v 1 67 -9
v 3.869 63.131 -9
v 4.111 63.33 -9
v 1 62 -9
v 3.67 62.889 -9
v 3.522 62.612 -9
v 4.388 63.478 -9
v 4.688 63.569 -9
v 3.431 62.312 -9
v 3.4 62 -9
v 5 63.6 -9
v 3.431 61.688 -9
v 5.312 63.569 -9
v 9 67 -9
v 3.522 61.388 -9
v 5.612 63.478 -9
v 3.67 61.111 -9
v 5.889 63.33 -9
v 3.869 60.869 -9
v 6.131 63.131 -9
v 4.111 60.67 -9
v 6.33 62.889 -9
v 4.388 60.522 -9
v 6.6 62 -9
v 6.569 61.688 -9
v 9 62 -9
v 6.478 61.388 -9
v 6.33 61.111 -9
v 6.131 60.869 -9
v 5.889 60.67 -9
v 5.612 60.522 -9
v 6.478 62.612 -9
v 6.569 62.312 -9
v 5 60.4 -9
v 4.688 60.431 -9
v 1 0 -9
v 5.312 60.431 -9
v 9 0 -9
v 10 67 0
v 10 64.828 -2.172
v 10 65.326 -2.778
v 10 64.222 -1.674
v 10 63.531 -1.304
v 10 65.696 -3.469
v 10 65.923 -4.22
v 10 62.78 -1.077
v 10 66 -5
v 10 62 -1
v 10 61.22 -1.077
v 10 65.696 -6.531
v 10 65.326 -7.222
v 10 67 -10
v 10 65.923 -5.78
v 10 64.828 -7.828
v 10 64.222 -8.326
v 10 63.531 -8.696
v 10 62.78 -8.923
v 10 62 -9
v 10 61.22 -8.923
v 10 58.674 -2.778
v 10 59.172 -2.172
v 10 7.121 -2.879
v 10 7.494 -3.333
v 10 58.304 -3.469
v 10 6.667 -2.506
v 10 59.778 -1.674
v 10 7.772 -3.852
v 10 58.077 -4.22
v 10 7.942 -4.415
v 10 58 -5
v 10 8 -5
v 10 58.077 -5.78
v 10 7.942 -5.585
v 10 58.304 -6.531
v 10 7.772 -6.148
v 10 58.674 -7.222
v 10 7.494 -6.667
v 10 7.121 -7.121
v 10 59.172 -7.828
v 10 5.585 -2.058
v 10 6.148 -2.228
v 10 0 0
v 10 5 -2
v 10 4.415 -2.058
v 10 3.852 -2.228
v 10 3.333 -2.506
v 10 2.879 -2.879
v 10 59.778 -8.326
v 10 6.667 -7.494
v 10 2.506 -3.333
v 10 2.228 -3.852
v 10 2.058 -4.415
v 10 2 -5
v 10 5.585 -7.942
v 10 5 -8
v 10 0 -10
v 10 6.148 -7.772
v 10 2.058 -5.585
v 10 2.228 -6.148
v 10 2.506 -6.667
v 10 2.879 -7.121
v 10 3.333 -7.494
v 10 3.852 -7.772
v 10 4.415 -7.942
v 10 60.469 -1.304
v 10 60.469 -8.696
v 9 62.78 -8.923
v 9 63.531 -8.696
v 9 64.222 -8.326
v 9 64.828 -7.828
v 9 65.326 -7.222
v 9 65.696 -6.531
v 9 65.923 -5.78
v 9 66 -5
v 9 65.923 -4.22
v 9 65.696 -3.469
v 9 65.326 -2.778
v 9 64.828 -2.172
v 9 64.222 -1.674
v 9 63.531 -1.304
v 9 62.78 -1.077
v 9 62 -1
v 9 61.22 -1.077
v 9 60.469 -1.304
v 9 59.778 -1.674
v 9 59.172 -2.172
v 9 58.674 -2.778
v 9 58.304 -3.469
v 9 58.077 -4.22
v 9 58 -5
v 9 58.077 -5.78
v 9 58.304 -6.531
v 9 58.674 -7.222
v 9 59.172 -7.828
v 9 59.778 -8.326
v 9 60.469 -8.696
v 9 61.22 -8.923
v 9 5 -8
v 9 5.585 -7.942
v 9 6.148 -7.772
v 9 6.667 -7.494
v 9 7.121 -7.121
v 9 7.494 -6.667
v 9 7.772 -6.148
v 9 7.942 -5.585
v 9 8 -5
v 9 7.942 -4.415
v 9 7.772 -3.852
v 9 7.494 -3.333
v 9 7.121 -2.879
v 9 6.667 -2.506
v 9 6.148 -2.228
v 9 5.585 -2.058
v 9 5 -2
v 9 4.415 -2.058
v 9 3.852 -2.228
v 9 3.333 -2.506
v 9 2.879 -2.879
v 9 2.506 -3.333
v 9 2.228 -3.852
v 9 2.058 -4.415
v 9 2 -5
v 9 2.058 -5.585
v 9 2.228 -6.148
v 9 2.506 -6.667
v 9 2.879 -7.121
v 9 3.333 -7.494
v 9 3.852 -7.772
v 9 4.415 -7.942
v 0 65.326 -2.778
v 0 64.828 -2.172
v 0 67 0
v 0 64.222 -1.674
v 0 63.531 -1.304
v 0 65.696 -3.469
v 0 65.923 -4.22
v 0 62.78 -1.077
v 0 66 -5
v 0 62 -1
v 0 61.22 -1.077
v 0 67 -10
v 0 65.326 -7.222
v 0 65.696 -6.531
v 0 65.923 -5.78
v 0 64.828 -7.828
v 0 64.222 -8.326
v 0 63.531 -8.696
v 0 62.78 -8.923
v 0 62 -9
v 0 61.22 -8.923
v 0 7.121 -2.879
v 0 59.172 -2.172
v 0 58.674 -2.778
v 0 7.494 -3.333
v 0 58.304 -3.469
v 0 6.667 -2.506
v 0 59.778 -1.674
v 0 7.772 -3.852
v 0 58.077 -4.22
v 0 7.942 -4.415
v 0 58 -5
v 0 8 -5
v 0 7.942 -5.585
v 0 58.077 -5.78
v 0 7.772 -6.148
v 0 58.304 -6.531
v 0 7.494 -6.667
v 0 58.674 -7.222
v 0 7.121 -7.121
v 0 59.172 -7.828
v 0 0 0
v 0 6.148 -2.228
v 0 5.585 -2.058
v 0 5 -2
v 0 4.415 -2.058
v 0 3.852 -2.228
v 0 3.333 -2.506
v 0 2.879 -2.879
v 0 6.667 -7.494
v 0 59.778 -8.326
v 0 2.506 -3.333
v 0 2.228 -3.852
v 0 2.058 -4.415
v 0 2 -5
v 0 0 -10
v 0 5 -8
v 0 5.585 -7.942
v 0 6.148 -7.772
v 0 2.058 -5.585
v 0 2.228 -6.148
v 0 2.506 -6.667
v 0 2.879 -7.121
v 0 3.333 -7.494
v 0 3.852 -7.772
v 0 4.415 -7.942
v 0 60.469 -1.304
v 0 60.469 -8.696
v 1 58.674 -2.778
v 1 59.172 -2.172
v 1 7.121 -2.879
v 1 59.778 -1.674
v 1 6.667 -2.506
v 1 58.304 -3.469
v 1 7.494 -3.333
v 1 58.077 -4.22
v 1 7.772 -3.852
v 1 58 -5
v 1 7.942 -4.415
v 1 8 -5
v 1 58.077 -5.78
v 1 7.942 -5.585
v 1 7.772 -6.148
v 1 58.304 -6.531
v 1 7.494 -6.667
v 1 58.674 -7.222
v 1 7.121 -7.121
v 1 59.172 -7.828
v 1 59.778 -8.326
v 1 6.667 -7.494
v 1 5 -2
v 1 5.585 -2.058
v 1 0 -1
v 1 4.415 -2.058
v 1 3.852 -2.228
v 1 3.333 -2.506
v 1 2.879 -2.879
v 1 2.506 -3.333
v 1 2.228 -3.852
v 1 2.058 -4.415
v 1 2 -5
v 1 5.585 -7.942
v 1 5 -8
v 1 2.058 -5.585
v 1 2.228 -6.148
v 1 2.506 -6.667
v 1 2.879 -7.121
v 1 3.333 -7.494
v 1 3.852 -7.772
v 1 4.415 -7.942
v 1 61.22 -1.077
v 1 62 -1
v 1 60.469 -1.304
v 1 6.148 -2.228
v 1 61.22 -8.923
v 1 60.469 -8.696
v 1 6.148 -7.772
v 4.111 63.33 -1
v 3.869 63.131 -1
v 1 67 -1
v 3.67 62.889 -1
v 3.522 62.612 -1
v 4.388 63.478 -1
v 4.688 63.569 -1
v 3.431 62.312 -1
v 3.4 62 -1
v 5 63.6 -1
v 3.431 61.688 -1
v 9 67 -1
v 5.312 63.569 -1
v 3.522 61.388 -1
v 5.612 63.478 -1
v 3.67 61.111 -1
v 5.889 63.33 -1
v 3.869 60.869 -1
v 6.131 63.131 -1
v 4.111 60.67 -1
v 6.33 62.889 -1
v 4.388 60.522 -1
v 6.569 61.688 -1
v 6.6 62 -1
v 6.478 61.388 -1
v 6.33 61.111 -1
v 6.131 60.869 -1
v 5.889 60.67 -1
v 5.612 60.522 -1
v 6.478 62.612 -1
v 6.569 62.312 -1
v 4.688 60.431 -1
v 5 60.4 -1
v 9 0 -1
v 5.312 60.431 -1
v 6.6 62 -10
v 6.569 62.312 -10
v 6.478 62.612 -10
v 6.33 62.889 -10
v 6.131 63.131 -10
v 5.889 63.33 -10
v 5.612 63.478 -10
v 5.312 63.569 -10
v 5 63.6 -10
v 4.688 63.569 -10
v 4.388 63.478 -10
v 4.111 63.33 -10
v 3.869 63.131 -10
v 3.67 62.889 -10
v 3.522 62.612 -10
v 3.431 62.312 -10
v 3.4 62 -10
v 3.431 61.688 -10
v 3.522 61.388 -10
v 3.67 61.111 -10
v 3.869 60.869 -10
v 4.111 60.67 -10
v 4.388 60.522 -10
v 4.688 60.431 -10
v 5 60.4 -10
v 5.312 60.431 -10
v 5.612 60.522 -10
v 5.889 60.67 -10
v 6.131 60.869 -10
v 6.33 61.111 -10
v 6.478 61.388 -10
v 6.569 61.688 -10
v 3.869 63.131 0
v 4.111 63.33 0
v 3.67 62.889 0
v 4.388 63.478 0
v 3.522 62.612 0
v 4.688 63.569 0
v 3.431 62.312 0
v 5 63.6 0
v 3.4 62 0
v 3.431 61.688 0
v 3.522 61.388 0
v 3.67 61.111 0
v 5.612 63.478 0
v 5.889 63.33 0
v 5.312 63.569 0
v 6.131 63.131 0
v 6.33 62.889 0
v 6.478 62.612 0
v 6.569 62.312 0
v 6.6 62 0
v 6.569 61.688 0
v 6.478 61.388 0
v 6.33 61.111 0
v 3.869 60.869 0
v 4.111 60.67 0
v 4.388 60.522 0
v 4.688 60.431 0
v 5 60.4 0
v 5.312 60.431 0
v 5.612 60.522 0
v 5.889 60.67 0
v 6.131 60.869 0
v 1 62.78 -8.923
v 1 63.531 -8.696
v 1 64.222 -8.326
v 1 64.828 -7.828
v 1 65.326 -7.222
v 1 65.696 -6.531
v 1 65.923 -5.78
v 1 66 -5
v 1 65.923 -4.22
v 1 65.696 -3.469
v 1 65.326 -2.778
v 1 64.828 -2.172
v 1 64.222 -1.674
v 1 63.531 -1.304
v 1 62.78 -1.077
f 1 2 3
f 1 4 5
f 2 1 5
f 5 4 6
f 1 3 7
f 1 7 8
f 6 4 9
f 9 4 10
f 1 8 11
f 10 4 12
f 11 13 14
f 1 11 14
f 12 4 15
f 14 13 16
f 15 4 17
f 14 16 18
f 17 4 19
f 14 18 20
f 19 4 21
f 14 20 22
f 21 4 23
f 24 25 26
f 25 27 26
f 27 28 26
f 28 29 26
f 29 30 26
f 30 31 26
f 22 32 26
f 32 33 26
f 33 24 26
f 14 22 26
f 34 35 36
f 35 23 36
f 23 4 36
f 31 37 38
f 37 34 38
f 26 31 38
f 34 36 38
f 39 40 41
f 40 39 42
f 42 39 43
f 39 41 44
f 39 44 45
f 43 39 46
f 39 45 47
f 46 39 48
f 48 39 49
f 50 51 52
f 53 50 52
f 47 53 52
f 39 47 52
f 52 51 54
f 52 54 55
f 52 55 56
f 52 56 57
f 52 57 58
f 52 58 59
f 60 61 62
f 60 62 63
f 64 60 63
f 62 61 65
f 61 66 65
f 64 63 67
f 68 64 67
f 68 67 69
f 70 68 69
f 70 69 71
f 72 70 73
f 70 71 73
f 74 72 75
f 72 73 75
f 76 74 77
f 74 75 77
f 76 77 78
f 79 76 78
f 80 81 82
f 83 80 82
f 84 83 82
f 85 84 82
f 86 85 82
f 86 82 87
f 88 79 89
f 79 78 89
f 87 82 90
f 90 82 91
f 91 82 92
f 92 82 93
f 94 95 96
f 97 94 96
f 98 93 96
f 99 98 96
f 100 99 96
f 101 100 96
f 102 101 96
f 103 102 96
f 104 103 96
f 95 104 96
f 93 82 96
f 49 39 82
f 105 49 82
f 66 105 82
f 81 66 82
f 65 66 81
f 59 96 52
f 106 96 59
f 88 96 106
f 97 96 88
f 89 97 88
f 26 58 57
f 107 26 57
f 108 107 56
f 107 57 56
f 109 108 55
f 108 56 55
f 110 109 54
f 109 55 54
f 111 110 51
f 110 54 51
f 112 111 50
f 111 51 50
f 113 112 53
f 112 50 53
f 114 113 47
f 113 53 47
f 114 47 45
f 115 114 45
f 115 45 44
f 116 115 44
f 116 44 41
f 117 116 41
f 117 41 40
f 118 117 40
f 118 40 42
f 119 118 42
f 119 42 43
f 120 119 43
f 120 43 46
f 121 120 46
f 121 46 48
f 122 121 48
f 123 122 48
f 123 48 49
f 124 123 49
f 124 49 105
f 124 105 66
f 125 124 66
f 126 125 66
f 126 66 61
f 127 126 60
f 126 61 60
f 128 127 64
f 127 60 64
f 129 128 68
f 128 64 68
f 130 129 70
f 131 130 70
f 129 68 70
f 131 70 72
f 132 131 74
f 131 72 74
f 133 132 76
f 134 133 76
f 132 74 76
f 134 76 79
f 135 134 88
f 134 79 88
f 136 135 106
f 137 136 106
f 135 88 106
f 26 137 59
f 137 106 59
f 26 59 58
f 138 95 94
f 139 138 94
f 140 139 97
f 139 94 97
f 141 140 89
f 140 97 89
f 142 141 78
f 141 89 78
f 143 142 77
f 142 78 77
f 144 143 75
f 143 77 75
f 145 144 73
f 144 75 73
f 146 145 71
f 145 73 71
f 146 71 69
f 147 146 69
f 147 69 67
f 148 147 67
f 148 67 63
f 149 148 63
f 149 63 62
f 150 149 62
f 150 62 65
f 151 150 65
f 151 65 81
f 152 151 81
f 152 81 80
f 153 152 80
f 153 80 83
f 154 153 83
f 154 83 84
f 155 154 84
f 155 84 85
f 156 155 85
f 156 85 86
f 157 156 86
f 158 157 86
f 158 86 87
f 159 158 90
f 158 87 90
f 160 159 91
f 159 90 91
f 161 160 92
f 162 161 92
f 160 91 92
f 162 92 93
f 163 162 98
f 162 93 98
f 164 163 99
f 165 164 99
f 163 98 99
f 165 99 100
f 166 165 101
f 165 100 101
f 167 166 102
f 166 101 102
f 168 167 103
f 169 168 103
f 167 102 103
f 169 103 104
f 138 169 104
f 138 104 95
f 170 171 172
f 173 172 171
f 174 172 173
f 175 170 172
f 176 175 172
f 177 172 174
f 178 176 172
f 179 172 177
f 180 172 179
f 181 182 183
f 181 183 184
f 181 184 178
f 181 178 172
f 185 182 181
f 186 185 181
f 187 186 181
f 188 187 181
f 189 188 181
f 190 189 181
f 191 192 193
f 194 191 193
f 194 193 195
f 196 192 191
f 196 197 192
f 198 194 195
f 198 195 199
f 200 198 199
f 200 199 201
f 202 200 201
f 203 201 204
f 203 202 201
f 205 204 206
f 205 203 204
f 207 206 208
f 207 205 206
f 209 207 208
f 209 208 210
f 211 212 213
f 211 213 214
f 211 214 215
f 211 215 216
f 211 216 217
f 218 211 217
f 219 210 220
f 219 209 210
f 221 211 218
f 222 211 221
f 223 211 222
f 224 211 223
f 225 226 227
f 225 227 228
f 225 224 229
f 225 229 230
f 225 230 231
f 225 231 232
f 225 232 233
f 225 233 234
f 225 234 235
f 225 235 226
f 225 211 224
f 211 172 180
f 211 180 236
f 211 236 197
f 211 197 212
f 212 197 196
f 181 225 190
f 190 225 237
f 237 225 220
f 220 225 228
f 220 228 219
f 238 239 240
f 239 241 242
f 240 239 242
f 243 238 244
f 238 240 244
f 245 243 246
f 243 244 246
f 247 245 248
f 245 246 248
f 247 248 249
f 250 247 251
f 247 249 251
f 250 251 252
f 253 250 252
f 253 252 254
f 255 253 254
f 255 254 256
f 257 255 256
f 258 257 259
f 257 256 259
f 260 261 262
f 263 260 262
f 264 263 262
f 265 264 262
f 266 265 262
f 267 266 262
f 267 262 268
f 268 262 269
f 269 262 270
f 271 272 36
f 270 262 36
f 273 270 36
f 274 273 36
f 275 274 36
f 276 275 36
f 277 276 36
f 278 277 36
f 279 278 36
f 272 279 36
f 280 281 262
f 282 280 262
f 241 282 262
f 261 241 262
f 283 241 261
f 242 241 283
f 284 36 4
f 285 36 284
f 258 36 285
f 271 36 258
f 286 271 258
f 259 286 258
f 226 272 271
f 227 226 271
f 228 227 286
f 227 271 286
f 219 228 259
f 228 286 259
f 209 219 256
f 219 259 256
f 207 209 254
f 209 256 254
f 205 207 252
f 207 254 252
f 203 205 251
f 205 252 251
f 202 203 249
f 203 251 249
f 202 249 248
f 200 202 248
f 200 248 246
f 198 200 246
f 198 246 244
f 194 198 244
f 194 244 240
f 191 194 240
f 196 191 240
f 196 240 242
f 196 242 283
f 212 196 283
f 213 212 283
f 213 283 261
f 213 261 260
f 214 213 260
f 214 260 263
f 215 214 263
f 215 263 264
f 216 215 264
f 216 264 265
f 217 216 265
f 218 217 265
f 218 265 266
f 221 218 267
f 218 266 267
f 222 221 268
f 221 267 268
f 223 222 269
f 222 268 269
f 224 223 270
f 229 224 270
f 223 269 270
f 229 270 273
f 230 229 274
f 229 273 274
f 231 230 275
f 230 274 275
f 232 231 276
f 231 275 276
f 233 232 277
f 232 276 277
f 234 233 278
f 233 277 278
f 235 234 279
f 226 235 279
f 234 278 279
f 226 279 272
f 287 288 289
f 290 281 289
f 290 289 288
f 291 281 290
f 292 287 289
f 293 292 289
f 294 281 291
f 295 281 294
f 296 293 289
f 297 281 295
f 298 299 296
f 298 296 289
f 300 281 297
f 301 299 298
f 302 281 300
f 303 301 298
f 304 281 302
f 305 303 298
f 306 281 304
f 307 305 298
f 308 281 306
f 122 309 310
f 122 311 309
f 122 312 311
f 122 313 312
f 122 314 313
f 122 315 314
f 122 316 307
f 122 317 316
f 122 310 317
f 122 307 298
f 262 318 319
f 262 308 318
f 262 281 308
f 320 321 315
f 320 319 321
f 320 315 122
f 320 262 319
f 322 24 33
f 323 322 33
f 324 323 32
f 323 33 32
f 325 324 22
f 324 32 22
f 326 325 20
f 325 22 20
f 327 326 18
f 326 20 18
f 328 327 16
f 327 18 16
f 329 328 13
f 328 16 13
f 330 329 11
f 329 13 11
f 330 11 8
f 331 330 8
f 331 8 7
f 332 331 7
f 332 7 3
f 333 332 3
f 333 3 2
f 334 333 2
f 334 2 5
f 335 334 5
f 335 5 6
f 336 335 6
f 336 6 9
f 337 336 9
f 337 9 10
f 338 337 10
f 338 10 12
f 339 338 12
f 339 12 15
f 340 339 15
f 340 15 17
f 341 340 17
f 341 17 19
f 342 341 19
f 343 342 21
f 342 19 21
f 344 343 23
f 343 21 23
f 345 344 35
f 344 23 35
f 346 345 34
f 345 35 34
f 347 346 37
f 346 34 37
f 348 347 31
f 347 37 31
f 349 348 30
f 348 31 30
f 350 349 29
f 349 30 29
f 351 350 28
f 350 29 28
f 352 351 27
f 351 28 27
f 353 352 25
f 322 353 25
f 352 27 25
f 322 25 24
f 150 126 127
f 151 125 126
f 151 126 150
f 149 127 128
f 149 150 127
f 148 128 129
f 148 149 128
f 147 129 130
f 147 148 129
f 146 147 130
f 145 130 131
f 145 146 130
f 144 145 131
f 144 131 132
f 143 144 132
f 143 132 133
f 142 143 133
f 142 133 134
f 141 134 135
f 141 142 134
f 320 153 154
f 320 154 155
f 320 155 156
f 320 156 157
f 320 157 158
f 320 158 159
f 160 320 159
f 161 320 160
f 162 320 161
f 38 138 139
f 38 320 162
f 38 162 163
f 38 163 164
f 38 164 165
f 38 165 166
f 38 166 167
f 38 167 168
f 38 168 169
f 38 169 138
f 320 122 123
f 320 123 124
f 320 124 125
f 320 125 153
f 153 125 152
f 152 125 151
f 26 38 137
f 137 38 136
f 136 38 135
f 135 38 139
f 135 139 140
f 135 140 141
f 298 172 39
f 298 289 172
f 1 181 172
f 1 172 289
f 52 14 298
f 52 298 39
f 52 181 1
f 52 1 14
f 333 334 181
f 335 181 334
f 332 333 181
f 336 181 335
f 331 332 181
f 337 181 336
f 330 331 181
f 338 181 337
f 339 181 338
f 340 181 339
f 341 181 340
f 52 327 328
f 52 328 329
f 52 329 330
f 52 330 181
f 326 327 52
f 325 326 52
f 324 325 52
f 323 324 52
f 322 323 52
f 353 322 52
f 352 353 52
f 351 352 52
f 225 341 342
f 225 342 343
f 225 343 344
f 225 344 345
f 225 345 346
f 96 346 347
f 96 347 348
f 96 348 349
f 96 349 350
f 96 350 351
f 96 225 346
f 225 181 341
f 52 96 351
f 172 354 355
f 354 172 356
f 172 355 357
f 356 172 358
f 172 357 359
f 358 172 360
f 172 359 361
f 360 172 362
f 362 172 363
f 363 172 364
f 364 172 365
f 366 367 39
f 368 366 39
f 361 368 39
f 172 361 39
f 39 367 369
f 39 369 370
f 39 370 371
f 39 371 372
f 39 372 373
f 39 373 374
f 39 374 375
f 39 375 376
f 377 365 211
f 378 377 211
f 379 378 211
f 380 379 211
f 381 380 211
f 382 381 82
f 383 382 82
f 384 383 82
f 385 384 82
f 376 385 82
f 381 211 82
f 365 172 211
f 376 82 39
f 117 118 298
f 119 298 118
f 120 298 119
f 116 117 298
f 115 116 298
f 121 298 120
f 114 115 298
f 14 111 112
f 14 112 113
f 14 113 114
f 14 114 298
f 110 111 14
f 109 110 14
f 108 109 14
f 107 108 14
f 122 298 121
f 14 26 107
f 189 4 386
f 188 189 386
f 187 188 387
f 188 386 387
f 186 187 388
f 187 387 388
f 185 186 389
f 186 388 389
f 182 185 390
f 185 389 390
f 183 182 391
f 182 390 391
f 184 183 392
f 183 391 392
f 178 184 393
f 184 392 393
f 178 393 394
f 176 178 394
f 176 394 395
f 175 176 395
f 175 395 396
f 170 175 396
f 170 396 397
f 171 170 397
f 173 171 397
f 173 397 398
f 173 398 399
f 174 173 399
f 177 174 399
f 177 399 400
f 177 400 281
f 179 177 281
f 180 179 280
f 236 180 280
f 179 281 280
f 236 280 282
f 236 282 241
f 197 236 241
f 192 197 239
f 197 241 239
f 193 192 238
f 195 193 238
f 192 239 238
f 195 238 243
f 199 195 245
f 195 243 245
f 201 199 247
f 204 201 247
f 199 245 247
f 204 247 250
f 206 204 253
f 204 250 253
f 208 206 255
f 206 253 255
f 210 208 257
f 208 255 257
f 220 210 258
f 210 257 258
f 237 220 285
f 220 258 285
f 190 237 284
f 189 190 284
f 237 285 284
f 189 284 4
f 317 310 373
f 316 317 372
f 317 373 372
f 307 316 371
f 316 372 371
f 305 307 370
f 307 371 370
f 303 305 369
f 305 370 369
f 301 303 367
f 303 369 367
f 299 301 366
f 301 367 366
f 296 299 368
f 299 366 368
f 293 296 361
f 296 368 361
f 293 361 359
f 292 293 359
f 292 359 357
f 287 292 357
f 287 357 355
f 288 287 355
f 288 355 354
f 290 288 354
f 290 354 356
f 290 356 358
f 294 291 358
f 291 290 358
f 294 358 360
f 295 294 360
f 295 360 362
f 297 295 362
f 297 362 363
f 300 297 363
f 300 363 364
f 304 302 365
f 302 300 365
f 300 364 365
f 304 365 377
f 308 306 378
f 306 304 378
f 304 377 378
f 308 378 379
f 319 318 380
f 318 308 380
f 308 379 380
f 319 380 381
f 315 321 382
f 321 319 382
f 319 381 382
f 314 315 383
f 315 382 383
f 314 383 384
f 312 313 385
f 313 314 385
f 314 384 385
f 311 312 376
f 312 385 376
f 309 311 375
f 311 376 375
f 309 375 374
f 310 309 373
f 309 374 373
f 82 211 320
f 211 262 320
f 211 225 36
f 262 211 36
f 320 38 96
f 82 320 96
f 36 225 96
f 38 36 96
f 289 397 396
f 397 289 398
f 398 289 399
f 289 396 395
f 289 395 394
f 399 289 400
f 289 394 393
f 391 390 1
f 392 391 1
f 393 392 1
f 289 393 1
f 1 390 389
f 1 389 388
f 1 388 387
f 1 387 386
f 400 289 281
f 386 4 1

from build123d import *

# Parameters (mm, degrees)
SKETCH_1_W          = 10
SKETCH_1_H          = 10
SKETCH_1_W_2        = 8
SKETCH_1_H_2        = 8
EXTRUDE_1_DEPTH     = 67
CUT_EXTRUDE_1_REACH = 70.476
SKETCH_2_R          = 1.6
CUT_EXTRUDE_2_REACH = 70.476
SKETCH_3_R          = 4
SKETCH_3_R_2        = 3


with BuildPart() as part:
    # ｽｹｯﾁ1 → 押し出し-薄板1 (new body)
    with BuildSketch(Plane(origin=(0, 0, 0), x_dir=(1, 0, 0), z_dir=(0, 1, 0))):
        with Locations((5, 5)):
            Rectangle(SKETCH_1_W, SKETCH_1_H)
        with Locations((5, 5)):
            Rectangle(SKETCH_1_W_2, SKETCH_1_H_2, mode=Mode.SUBTRACT)
    extrude(amount=EXTRUDE_1_DEPTH)

    # ｶｯﾄ - 押し出し1: up to this face of the body (flat: up to its plane)
    cut_extrude_1_end = Plane(part.part.faces().sort_by_distance((5, 33.5, -10))[0])
    # ｽｹｯﾁ2 → ｶｯﾄ - 押し出し1 (cut, up to the picked face)
    with BuildSketch(Plane.XY, mode=Mode.PRIVATE) as cut_extrude_1_sk1:
        with Locations((5, 62)):
            Circle(SKETCH_2_R)
    cut_extrude_1_tool1 = split(extrude(cut_extrude_1_sk1.sketch, amount=-CUT_EXTRUDE_1_REACH, mode=Mode.PRIVATE), bisect_by=cut_extrude_1_end, keep=Keep.BOTH, mode=Mode.PRIVATE)
    add(cut_extrude_1_tool1.solids().sort_by(Axis((5, 62, 0), (0, 0, -1)))[0], mode=Mode.SUBTRACT)

    # ｶｯﾄ - 押し出し2: up to this face of the body (flat: up to its plane)
    cut_extrude_2_end = Plane(part.part.faces().sort_by_distance((0, 33.5, -5))[0])
    # ｽｹｯﾁ3 → ｶｯﾄ - 押し出し2 (cut, up to the picked face)
    with BuildSketch(Plane(origin=(10, 0, 0), x_dir=(0, 0, -1), z_dir=(1, 0, 0)), mode=Mode.PRIVATE) as cut_extrude_2_sk1:
        with Locations((5, 62)):
            Circle(SKETCH_3_R)
    cut_extrude_2_tool1 = split(extrude(cut_extrude_2_sk1.sketch, amount=-CUT_EXTRUDE_2_REACH, mode=Mode.PRIVATE), bisect_by=cut_extrude_2_end, keep=Keep.BOTH, mode=Mode.PRIVATE)
    # ｽｹｯﾁ3 → ｶｯﾄ - 押し出し2 (cut, up to the picked face)
    with BuildSketch(Plane(origin=(10, 0, 0), x_dir=(0, 0, -1), z_dir=(1, 0, 0)), mode=Mode.PRIVATE) as cut_extrude_2_sk2:
        with Locations((5, 5)):
            Circle(SKETCH_3_R_2)
    cut_extrude_2_tool2 = split(extrude(cut_extrude_2_sk2.sketch, amount=-CUT_EXTRUDE_2_REACH, mode=Mode.PRIVATE), bisect_by=cut_extrude_2_end, keep=Keep.BOTH, mode=Mode.PRIVATE)
    add(cut_extrude_2_tool1.solids().sort_by(Axis((10, 62, -5), (-1, 0, 0)))[0], mode=Mode.SUBTRACT)
    add(cut_extrude_2_tool2.solids().sort_by(Axis((10, 5, -5), (-1, 0, 0)))[0], mode=Mode.SUBTRACT)


solid = part.part
